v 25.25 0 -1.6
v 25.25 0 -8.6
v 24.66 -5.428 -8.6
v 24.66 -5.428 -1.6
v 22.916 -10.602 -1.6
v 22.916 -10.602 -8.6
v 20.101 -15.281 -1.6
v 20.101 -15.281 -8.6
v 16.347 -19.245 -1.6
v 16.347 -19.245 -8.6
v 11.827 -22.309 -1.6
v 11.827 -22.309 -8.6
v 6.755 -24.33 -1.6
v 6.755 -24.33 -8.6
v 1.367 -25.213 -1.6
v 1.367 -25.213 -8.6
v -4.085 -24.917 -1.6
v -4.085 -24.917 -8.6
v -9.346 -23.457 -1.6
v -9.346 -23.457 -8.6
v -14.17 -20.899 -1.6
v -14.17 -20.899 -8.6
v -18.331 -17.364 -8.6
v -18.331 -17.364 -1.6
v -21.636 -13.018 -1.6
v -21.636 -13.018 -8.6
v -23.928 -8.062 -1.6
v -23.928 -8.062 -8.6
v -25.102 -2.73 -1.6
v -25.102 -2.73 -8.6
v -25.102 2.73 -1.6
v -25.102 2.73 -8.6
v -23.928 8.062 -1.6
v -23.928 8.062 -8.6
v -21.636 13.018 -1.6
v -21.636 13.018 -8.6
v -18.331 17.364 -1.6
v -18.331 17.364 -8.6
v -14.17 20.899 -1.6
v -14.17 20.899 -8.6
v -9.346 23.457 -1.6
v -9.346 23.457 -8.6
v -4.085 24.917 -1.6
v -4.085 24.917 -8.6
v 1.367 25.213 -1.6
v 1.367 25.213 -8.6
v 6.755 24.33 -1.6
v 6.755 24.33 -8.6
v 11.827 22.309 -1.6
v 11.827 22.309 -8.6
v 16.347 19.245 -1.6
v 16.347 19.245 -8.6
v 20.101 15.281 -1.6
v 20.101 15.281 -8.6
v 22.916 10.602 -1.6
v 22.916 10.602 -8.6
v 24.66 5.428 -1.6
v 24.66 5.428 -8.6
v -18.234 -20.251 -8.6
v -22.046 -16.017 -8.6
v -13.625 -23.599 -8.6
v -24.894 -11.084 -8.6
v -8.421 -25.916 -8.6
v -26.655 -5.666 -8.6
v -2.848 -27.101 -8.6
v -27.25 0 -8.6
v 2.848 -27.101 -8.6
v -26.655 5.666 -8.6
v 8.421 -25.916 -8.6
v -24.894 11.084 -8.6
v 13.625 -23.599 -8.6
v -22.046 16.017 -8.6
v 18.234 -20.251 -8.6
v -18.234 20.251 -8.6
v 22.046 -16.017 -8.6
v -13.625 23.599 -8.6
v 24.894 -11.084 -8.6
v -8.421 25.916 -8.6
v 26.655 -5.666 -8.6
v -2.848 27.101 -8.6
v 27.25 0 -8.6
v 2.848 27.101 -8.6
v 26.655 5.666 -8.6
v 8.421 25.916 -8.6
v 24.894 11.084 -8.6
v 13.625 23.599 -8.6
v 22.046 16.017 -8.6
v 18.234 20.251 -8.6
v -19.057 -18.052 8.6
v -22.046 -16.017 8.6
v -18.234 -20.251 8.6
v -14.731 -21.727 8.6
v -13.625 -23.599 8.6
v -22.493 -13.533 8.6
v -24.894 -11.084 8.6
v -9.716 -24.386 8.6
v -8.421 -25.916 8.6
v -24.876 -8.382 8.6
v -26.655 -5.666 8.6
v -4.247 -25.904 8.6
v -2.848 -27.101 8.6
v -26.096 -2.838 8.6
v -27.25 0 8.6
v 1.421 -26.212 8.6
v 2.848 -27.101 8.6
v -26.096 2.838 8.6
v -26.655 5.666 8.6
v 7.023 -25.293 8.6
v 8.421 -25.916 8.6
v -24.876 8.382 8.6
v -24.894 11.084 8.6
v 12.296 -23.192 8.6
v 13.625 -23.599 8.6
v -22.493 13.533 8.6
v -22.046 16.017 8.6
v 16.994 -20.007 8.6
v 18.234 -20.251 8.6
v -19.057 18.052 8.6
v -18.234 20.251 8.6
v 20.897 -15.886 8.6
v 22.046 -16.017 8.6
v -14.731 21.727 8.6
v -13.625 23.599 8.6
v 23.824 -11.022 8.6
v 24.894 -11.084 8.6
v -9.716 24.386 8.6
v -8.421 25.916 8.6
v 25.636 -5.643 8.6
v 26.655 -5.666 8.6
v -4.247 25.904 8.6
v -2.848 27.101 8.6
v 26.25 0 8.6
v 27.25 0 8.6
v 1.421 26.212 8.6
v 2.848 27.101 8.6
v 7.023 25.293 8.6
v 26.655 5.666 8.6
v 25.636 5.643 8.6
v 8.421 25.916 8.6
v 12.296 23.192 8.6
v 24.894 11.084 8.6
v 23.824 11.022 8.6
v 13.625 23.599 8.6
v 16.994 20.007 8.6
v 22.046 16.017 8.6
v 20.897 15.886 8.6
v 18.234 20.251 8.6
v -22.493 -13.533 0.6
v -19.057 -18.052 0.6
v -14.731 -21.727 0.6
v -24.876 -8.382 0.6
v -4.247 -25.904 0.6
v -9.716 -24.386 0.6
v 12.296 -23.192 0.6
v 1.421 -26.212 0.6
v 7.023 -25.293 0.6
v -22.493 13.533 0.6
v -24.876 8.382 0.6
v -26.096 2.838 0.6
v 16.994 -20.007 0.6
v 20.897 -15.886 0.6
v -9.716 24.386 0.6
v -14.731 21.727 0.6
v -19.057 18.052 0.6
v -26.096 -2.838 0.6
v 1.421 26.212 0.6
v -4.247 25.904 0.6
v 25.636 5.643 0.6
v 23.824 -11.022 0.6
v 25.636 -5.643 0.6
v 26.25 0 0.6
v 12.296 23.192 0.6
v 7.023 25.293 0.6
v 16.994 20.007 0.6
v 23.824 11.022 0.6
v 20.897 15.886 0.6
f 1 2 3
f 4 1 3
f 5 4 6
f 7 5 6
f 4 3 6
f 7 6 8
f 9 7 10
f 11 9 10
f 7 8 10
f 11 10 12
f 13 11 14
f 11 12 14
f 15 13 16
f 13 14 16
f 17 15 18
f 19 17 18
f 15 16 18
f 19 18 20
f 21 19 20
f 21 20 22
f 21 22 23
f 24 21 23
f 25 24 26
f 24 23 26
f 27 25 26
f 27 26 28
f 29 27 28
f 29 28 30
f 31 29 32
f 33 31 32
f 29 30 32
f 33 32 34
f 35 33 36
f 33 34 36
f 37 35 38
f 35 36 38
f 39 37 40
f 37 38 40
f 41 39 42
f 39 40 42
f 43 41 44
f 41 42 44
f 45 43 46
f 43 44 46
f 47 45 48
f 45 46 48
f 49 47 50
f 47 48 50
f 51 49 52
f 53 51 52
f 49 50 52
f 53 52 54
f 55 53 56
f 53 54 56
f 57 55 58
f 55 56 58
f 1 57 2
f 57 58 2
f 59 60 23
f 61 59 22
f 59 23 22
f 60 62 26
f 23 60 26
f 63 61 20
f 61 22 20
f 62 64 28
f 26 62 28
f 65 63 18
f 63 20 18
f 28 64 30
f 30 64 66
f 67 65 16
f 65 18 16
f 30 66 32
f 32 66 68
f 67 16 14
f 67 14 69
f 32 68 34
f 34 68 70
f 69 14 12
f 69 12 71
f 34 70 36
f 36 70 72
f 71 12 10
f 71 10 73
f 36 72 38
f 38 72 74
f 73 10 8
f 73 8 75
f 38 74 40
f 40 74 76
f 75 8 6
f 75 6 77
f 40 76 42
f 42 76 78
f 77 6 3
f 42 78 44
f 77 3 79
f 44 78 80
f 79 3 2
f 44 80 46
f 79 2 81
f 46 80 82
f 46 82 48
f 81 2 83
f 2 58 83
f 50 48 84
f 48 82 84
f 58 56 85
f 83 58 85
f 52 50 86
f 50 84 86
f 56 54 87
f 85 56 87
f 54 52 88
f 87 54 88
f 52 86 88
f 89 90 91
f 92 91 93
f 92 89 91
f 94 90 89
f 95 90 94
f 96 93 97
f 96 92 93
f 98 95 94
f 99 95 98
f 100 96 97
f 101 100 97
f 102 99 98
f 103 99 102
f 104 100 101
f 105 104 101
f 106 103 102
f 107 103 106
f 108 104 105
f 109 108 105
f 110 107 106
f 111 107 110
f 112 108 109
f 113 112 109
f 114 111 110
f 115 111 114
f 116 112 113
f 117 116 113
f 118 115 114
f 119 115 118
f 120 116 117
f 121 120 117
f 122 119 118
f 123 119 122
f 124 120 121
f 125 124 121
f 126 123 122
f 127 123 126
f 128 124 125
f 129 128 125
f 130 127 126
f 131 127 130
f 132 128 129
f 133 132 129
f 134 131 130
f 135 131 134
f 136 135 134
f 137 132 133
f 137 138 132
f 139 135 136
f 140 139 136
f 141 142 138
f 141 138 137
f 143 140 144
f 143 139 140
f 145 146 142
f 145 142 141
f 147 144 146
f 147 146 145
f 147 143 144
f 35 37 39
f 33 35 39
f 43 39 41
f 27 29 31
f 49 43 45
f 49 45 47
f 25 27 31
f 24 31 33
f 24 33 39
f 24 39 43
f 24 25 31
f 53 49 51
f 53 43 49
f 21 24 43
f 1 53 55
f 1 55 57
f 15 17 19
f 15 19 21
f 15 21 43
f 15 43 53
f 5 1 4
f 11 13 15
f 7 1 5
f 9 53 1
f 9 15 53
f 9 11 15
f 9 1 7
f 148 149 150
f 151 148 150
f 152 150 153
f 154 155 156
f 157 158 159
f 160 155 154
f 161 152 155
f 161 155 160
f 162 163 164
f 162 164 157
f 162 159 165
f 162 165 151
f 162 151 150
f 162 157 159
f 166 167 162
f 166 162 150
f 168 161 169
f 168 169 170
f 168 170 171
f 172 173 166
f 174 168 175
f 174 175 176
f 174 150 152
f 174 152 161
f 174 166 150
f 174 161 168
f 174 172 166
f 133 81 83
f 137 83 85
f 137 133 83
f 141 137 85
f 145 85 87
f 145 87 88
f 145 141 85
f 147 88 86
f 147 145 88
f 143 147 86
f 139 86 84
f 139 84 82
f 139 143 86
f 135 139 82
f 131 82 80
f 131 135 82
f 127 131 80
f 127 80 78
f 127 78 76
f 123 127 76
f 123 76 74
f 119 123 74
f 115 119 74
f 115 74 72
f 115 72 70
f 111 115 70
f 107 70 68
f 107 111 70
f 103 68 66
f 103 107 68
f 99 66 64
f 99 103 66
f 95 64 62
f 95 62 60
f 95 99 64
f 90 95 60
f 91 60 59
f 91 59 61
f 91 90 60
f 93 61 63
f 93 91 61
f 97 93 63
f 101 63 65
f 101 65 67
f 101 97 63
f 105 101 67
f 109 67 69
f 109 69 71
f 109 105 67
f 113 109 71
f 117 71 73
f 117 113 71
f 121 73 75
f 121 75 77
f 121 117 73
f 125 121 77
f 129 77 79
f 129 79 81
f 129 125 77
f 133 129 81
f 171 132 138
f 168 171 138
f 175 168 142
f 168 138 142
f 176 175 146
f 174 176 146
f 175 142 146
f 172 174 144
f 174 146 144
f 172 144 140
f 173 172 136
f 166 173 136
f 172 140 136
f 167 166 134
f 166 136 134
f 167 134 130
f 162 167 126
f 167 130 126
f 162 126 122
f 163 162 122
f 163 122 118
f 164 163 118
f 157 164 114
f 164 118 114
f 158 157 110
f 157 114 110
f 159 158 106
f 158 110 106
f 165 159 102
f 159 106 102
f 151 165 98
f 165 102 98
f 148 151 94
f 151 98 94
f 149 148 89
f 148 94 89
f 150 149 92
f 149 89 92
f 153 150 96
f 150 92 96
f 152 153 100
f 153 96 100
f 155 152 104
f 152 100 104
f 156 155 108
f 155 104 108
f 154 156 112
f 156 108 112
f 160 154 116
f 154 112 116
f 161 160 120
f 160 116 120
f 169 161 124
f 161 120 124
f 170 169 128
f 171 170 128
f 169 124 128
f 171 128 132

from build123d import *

# Parameters (mm, degrees)
F0_R     = 27.25
F1_DEPTH = 8.6
F2_R     = 26.25
F3_DEPTH = 8
F4_R     = 25.25
F5_DEPTH = 7


with BuildPart() as f1:
    # F0 (on Top) → F1 (new body, symmetric)
    with BuildSketch(Plane.XY):
        Circle(F0_R)
    extrude(amount=F1_DEPTH, both=True)

    # F2 (on face) → F3 (cut)
    with BuildSketch(Plane.XY.offset(8.6)):
        Circle(F2_R)
    extrude(amount=-F3_DEPTH, mode=Mode.SUBTRACT)

    # F4 (on face) → F5 (cut)
    with BuildSketch(Plane(origin=(0, 0, -8.6), x_dir=(1, 0, 0), z_dir=(0, 0, -1))):
        Circle(F4_R)
    extrude(amount=-F5_DEPTH, mode=Mode.SUBTRACT)


solid = f1.part
